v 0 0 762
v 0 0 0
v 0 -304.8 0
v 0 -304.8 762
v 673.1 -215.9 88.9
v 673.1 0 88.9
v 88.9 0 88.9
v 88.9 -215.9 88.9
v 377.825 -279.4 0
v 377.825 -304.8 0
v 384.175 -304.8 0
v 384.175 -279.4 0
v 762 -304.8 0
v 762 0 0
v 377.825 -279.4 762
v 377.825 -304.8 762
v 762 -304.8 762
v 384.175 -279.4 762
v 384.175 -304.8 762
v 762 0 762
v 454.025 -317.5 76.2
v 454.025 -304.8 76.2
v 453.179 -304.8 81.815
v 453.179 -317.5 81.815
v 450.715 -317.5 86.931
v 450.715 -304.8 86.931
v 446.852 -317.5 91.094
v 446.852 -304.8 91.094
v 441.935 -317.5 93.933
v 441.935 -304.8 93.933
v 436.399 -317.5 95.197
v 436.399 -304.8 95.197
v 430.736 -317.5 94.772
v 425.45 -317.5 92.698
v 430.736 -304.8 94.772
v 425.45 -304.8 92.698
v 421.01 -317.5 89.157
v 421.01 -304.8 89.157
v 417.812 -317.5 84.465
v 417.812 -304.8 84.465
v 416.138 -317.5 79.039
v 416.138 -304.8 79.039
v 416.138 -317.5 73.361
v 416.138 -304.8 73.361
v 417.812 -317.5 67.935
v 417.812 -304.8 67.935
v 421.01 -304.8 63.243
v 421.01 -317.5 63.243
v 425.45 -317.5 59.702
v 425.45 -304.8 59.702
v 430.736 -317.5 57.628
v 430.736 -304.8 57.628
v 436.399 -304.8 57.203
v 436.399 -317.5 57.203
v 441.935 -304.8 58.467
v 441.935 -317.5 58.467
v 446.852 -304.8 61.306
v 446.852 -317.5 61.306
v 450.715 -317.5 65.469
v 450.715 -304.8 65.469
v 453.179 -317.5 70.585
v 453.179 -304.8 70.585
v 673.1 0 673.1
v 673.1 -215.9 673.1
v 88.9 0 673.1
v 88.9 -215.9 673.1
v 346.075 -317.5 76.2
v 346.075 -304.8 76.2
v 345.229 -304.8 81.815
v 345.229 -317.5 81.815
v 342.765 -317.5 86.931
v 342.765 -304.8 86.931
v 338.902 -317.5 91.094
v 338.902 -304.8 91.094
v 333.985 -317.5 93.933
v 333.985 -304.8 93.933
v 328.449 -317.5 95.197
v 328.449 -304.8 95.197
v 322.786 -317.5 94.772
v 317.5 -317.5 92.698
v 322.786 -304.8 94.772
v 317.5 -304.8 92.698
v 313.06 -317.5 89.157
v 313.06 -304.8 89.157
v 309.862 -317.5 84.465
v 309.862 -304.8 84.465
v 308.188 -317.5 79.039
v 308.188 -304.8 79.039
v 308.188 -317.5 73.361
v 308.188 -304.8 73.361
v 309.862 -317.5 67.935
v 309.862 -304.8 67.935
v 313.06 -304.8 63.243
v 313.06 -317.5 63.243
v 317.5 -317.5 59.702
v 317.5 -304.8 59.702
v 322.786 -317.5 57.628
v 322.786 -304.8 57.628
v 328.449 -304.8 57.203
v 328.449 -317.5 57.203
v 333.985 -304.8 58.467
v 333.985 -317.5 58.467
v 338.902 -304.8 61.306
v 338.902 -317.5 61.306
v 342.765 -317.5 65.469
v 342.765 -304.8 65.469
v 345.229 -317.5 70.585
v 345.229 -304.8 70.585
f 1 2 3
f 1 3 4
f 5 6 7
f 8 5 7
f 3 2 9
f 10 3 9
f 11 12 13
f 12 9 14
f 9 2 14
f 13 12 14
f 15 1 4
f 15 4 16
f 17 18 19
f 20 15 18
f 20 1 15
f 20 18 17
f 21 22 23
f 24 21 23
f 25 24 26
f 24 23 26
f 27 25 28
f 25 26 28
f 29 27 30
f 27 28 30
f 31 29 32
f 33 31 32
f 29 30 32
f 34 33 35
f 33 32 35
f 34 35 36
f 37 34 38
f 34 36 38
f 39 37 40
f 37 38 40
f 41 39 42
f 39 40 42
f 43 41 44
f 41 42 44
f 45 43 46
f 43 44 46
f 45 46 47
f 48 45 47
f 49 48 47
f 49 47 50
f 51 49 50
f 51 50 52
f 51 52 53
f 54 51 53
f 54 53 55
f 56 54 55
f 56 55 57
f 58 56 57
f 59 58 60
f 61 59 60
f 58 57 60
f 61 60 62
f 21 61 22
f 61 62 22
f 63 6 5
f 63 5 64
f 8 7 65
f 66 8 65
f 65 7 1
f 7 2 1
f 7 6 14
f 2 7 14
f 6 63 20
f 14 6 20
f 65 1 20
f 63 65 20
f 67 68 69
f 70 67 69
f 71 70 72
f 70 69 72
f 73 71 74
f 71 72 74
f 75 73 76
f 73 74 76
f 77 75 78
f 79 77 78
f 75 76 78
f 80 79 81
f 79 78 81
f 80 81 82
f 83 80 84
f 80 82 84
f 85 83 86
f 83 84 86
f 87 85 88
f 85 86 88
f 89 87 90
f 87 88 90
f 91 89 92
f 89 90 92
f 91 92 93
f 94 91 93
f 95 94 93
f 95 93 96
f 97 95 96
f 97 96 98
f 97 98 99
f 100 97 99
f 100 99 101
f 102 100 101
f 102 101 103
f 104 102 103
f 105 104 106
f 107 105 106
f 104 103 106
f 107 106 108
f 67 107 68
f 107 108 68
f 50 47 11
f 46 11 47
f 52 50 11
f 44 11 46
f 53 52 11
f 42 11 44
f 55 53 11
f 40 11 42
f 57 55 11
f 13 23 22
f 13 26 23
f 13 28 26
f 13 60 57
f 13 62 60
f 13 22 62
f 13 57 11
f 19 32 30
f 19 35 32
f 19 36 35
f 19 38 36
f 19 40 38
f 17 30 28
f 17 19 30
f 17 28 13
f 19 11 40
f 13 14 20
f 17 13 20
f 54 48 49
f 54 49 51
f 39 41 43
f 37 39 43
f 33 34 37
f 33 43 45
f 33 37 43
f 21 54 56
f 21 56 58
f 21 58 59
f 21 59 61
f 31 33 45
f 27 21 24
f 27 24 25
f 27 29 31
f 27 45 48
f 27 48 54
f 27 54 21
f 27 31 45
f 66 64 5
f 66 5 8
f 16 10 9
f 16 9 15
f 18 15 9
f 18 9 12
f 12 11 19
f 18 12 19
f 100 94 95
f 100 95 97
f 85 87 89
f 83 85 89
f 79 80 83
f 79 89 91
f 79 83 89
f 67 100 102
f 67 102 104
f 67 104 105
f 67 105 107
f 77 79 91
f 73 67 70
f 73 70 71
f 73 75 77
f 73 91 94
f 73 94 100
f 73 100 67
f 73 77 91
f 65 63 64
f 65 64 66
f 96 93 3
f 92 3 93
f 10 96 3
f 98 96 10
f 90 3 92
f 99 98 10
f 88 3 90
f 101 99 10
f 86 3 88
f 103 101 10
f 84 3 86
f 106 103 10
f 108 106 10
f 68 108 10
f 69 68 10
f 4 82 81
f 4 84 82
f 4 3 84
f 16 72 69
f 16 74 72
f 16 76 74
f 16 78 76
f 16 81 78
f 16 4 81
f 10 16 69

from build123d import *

# Parameters (mm, degrees)
F0_W     = 762
F0_H     = 762
F1_DEPTH = 304.8
F2_W     = 6.35
F2_H     = 762
F3_DEPTH = 25.4
F4_R     = 19.05
F5_DEPTH = 12.7
F6_W     = 584.2
F6_H     = 584.2
F7_DEPTH = 215.9


with BuildPart() as f1:
    # F0 (on Front) → F1 (new body)
    with BuildSketch(Plane.XZ):
        with Locations((381, 381)):
            Rectangle(F0_W, F0_H)
    extrude(amount=F1_DEPTH)

    # F2 (on face) → F3 (cut)
    with BuildSketch(Plane.XZ.offset(304.8)):
        with Locations((381, 381)):
            Rectangle(F2_W, F2_H)
    extrude(amount=-F3_DEPTH, mode=Mode.SUBTRACT)

    # F4 (on face) → F5 (join)
    with BuildSketch(Plane.XZ.offset(304.8)):
        with Locations((327.025, 76.2)):
            Circle(F4_R)
        with Locations((434.975, 76.2)):
            Circle(F4_R)
    extrude(amount=F5_DEPTH)

    # F6 (on face) → F7 (cut)
    with BuildSketch(Plane(origin=(0, 0, 0), x_dir=(-1, 0, 0), z_dir=(0, 1, 0))):
        with Locations((-381, 381)):
            Rectangle(F6_W, F6_H)
    extrude(amount=-F7_DEPTH, mode=Mode.SUBTRACT)


solid = f1.part
